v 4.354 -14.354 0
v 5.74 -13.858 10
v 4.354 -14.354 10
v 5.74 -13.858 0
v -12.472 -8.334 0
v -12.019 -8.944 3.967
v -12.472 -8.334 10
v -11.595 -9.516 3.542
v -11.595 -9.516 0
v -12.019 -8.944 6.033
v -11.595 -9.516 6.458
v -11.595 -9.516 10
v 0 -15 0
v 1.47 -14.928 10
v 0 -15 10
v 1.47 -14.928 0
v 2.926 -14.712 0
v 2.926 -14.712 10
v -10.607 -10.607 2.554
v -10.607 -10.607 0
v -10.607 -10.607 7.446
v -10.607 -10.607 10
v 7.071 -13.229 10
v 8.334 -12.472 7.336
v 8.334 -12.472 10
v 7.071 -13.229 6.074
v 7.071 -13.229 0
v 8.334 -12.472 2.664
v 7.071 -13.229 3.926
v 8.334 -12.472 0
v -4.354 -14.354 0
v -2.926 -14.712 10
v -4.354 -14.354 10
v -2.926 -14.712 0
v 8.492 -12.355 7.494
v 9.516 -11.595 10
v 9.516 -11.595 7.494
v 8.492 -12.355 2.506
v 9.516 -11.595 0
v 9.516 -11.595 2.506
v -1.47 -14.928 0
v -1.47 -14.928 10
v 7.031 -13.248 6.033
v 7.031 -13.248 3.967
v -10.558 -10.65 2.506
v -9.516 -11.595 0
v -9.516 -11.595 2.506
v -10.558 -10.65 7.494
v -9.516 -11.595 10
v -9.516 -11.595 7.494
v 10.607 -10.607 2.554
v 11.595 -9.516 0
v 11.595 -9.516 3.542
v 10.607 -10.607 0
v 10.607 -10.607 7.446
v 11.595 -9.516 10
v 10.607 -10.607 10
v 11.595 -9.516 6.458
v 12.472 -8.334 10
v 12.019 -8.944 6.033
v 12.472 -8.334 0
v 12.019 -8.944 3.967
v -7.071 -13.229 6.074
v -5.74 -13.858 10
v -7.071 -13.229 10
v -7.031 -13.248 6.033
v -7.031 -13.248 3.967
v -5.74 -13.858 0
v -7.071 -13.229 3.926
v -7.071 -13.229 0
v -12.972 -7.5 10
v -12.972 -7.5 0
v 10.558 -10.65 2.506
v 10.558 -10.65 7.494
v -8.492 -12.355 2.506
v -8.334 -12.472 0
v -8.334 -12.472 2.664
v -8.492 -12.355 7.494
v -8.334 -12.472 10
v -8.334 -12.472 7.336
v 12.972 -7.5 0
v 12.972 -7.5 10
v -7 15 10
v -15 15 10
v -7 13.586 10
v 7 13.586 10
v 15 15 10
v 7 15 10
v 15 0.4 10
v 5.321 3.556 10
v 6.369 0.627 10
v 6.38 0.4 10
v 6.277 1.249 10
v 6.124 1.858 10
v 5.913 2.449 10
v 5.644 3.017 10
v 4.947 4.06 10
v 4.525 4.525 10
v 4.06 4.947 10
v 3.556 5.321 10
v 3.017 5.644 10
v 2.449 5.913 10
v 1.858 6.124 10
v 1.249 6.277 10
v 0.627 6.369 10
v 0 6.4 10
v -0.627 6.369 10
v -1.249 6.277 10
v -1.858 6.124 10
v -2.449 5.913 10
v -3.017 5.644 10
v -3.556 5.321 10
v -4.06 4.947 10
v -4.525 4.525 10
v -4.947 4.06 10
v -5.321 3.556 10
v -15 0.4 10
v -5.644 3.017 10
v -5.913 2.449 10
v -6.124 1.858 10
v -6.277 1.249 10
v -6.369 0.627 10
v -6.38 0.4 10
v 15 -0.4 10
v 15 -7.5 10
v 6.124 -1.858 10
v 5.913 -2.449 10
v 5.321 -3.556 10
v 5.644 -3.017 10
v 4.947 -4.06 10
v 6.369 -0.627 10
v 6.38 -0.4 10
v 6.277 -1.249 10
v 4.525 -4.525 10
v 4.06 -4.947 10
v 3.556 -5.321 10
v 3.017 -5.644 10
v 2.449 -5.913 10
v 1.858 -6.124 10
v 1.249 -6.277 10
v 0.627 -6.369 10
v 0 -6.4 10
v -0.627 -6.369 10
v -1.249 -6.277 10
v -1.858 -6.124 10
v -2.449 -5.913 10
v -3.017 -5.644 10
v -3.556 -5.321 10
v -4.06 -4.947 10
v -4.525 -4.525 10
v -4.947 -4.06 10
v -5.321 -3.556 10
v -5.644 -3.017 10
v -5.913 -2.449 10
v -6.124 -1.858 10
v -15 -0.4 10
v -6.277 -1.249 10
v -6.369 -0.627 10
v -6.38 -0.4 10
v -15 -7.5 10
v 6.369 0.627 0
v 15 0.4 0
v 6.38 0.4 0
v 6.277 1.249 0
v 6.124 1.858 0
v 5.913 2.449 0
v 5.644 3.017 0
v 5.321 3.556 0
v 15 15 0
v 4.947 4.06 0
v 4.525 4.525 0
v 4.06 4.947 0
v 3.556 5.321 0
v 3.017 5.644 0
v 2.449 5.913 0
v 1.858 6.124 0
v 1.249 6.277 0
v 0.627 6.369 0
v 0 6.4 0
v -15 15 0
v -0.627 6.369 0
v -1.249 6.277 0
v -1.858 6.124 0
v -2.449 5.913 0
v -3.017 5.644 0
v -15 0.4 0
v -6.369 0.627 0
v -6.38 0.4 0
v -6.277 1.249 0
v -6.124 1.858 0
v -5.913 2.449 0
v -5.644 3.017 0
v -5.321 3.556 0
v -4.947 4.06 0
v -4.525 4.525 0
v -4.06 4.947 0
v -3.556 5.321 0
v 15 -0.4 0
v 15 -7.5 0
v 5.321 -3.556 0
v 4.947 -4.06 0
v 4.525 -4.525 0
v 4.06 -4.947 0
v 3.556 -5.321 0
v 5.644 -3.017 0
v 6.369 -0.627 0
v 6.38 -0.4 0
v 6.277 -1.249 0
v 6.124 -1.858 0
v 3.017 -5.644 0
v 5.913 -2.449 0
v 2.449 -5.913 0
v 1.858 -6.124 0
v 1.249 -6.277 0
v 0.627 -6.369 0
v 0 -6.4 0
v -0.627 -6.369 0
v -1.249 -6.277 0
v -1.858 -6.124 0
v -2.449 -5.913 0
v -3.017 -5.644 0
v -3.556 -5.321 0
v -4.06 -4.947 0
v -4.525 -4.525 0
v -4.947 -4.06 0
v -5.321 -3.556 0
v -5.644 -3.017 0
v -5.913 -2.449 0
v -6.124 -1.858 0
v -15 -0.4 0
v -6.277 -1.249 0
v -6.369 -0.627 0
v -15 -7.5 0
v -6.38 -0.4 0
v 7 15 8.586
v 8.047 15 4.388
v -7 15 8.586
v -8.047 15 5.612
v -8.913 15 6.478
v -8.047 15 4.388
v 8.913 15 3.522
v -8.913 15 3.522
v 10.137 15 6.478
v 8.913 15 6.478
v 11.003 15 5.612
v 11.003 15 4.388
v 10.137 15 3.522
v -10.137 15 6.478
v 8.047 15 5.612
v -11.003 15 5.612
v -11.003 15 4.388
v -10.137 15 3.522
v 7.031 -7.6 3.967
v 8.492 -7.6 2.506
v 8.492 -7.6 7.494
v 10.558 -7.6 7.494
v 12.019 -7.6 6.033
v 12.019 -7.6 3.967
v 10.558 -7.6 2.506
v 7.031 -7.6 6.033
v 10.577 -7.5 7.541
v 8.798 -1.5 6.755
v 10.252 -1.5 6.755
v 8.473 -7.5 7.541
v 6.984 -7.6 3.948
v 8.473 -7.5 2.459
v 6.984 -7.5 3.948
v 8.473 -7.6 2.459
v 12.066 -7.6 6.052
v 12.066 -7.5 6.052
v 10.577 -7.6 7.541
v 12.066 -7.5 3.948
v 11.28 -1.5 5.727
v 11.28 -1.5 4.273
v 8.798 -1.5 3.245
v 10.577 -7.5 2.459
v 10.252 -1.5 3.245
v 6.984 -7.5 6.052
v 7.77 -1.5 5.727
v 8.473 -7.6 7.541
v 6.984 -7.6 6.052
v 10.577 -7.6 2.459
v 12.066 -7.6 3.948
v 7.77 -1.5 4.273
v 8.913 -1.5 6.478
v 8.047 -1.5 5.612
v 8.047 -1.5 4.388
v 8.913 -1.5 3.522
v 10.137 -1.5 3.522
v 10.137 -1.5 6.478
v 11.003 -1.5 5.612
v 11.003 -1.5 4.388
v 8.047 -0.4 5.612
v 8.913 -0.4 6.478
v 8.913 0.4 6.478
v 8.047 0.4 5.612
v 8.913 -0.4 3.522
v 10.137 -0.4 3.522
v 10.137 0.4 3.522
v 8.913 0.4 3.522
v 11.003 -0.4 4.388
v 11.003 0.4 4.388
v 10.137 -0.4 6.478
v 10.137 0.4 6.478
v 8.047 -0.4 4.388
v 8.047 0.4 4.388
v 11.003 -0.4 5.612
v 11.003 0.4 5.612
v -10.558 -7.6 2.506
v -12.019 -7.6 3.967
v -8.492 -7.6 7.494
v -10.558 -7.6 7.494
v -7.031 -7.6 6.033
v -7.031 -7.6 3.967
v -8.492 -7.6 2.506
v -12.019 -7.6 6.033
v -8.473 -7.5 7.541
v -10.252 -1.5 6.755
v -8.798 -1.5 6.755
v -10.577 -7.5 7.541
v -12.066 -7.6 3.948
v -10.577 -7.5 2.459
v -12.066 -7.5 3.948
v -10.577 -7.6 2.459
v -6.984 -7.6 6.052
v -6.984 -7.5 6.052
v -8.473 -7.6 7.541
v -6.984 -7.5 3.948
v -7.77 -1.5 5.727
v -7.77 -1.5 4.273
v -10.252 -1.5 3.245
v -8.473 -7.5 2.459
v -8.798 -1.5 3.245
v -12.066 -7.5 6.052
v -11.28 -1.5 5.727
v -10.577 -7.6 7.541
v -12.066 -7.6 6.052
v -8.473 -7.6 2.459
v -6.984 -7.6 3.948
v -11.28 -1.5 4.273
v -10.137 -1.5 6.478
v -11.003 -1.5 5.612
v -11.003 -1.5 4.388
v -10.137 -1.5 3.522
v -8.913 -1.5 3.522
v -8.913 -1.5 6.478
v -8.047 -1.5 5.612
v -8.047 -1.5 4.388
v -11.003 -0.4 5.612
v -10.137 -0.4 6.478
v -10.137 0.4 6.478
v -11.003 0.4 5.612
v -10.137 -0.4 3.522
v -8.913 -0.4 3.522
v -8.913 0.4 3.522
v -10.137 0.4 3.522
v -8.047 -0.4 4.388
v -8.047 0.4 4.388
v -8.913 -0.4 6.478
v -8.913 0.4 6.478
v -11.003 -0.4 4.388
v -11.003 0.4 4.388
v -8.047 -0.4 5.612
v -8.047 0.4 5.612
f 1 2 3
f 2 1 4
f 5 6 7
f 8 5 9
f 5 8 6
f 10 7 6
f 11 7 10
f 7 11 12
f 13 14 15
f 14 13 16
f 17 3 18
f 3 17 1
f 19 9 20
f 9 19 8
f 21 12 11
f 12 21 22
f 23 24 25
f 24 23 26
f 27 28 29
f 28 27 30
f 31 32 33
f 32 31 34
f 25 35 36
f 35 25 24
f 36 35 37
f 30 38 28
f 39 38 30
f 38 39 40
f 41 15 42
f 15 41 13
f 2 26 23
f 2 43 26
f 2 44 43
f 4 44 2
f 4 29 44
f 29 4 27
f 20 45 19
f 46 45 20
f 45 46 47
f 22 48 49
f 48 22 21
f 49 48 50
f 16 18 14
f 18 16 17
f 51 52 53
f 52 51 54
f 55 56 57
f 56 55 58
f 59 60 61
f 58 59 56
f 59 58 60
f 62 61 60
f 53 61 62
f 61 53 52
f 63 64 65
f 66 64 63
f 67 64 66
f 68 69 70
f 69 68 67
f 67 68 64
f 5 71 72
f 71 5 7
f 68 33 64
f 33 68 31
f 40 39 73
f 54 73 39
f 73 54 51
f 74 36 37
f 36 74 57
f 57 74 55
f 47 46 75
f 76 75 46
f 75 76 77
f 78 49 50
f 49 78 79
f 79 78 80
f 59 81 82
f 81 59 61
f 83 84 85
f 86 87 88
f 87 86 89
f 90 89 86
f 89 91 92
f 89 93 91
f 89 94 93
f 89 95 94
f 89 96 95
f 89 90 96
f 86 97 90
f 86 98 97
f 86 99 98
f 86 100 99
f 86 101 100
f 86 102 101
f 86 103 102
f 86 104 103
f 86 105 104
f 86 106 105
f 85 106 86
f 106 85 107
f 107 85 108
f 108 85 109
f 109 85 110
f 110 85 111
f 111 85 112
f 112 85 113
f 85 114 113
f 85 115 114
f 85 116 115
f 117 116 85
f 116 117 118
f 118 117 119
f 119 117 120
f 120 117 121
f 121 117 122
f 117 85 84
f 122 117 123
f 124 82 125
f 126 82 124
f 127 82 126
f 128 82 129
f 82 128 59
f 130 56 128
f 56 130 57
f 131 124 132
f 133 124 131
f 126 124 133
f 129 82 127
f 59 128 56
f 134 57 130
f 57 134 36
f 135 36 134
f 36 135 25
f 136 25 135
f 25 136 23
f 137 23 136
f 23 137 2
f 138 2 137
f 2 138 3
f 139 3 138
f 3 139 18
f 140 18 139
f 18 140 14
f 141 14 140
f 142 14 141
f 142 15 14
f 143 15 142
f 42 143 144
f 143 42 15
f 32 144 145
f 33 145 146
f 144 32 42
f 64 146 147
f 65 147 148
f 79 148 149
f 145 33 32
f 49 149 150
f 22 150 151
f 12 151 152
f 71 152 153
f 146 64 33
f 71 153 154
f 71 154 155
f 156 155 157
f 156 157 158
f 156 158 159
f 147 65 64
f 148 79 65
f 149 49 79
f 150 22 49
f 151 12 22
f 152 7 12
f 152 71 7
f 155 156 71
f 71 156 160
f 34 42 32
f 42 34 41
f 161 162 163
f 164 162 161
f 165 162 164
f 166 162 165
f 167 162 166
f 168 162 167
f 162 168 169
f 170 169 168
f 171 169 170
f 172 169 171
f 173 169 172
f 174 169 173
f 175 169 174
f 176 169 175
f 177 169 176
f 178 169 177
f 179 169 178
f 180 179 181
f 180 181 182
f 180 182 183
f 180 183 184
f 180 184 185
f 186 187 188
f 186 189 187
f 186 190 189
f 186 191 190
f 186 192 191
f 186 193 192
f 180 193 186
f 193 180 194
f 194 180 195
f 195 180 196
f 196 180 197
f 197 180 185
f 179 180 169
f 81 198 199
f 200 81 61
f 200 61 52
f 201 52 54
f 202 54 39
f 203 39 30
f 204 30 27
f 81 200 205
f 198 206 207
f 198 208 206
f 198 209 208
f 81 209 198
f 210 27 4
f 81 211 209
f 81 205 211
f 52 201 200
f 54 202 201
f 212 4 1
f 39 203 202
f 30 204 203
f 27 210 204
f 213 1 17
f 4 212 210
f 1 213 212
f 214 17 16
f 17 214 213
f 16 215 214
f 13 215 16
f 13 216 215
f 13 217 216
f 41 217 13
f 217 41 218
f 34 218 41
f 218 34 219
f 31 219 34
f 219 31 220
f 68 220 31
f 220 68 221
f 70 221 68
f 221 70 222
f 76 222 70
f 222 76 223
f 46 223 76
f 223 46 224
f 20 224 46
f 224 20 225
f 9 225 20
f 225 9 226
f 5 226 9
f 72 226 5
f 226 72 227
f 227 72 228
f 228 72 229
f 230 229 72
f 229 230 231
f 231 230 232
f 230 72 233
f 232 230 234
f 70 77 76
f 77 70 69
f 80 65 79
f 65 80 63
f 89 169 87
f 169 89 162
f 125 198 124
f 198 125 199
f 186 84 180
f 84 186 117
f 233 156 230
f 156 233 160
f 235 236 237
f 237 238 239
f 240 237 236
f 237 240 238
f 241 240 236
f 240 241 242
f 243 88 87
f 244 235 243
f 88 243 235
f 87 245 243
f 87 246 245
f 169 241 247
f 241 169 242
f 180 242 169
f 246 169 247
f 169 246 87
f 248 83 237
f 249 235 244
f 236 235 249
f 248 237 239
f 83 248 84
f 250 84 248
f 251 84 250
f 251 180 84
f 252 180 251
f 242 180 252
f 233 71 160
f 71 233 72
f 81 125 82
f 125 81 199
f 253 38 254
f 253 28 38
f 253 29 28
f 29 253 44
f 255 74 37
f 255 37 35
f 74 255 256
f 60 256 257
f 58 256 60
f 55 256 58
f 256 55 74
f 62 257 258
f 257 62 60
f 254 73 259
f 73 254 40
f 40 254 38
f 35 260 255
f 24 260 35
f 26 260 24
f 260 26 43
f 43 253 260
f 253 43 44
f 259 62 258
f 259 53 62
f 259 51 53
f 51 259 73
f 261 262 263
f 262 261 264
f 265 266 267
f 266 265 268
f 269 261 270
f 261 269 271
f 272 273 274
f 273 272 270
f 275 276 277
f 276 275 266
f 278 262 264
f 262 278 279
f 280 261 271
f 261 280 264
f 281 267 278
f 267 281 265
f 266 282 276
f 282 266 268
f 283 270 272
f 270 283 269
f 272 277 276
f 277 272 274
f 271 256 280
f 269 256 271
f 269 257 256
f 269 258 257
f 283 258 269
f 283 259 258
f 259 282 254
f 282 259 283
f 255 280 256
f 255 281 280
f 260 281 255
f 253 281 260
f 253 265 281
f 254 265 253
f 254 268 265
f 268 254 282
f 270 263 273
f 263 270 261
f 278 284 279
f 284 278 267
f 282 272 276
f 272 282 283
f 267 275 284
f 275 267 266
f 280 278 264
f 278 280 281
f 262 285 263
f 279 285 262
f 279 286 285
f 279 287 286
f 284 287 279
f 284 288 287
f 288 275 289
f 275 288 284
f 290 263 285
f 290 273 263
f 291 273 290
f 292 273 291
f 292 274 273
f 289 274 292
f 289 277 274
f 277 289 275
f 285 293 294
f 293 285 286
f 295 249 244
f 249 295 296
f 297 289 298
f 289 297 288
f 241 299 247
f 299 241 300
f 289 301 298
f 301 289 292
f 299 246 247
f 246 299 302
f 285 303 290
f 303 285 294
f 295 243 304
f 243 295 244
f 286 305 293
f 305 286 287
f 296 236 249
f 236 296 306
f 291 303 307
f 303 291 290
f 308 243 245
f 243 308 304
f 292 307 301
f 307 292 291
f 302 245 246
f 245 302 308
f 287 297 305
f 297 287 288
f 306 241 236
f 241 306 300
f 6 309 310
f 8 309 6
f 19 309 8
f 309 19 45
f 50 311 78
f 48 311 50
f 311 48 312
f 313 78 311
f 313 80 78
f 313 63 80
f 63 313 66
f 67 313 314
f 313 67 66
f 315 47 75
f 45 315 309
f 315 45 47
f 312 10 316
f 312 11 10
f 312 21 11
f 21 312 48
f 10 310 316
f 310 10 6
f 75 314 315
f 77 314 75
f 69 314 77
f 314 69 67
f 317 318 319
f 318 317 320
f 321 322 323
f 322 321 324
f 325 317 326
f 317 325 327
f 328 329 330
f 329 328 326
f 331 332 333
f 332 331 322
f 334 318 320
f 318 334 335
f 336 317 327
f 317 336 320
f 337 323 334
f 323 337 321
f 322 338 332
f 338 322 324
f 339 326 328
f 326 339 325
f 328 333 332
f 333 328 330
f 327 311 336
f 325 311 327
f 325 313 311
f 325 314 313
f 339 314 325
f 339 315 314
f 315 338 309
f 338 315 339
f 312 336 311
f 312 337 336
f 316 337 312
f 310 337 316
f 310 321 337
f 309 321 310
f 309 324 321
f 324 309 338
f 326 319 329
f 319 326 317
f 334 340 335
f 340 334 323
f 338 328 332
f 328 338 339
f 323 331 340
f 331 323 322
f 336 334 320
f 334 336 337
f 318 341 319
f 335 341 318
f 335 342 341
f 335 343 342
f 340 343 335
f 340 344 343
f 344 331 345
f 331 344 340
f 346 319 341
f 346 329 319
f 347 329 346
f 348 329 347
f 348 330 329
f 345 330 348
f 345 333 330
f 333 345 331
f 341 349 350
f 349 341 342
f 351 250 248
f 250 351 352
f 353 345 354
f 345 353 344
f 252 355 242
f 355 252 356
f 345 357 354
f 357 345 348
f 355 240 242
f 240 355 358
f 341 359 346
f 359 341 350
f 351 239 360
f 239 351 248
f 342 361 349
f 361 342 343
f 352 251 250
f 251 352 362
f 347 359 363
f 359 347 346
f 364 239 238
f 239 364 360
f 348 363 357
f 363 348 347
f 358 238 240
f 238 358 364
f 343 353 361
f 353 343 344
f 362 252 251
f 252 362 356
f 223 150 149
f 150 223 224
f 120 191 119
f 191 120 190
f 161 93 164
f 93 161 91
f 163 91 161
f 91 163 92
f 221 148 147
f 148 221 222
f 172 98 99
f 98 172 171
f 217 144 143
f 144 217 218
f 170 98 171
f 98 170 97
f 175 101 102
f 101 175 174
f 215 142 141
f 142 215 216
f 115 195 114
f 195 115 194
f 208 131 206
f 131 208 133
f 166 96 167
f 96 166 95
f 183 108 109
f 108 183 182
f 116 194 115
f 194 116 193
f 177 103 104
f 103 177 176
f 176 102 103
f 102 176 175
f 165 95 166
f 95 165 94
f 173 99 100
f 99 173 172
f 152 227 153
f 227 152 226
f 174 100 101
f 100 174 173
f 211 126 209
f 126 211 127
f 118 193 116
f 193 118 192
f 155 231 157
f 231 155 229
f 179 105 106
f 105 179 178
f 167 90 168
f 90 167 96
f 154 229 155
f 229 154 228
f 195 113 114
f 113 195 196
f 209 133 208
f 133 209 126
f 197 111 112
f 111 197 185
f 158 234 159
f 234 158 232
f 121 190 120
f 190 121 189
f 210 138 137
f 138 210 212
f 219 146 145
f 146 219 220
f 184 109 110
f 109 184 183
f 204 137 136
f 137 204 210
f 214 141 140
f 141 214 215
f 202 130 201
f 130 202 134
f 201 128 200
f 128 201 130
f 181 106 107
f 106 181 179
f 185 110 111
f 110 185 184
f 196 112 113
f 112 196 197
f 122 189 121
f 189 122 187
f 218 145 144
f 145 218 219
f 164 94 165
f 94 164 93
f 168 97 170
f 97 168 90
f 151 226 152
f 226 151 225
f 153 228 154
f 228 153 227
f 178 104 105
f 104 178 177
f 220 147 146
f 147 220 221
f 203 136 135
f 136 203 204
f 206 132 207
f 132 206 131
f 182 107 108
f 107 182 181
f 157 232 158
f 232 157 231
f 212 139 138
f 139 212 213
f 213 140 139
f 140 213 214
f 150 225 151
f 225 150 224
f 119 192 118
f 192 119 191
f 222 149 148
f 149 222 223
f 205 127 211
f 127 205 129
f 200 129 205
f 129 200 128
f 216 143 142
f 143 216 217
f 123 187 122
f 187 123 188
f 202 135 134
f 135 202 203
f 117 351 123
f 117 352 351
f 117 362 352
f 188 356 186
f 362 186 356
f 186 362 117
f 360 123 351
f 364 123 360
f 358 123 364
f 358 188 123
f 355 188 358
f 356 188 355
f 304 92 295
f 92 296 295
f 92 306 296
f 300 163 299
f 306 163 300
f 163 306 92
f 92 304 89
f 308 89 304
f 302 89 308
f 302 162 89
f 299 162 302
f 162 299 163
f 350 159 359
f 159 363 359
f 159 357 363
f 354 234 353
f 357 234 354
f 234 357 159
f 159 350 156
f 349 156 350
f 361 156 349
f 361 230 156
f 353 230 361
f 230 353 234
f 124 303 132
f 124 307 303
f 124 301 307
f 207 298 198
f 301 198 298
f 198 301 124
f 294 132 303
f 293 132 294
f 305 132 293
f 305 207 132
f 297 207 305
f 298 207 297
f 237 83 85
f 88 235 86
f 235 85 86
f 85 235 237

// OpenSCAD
/* shaft mount for end stops. 
 * diameter in mm.abs
 * 19mm = 3/4" between screw centers
 */
inch = 25.4;
eps = 0.001;
eps2 = 0.002;
inf = 10000;
nozzle_width=0.4;
$fn=64;

height = 10.0;
width = 30.0;
split = 0.8;
screw_offset = 3/4*inch / 2.0;

module endstop(dia) {
    difference() {
        endstop_body();
        endstop_holes(dia+2*nozzle_width);
    }
}

module endstop_body() {
    {
        cylinder(h=height,d=width);
        translate([-width/2,-width/4,0])
        cube([width, 3/4*width, height]);
    }
}
    
module endstop_holes(dia) {
    cylinder(h=3*height, d=dia, center=true);
    cube([2*width, split, 3*height], center=true);
    translate([screw_offset, 0, height/2])
    endstop_screw();
    translate([-screw_offset, 0, height/2])
    endstop_screw();
    translate([0,width/2,height])
    rotate([45,0,0])
    cube([14,2,3], center=true);
}

module endstop_screw() {
    rotate([-90,0,0])
    rotate([0,0,180/8])
    cylinder(d=3.2,h=2*width,$fn=8,center=true);
    rotate([90,0,0])
    translate([0,0,width/4]) {
        rotate([0,0,180/8])
        cylinder(d=5.4,h=2*width, $fn=8);
        m3_heat_set_insert();
    }
}

/* m3 heat set insert
 * 6.0 mm high
 * dia top 5.0 mm
 * dia bottom 4.0 mm
 * cone 8 degree taper angle, from 4.0mm - 0.2 mm = 3.8mm, height = 6.0 mm
 */

module m3_heat_set_insert() {
    hull() {
        rotate([0,0,180/8])
        cylinder(d=5.5,h=0.1,$fn=8);
        translate([0,0,-6])
        rotate([0,0,180/8])
        cylinder(d=3.8,h=0.1,$fn=8);
    }
}

module endstop_a(dia) {
    intersection() {
        translate([-inf,0,0])
        cube([2*inf, inf, inf]);
        endstop(dia);
    }
}

module endstop_b(dia) {
    intersection() {
        endstop(dia);
        translate([-inf,-inf,0])
        cube([2*inf, inf, inf]);
    }
}

//endstop(8.0);
//endstop_a(8.0);
//endstop_b(8.0);

endstop(12.0);
//endstop_a(12.0);
//endstop_b(12.0);

// not truncated
